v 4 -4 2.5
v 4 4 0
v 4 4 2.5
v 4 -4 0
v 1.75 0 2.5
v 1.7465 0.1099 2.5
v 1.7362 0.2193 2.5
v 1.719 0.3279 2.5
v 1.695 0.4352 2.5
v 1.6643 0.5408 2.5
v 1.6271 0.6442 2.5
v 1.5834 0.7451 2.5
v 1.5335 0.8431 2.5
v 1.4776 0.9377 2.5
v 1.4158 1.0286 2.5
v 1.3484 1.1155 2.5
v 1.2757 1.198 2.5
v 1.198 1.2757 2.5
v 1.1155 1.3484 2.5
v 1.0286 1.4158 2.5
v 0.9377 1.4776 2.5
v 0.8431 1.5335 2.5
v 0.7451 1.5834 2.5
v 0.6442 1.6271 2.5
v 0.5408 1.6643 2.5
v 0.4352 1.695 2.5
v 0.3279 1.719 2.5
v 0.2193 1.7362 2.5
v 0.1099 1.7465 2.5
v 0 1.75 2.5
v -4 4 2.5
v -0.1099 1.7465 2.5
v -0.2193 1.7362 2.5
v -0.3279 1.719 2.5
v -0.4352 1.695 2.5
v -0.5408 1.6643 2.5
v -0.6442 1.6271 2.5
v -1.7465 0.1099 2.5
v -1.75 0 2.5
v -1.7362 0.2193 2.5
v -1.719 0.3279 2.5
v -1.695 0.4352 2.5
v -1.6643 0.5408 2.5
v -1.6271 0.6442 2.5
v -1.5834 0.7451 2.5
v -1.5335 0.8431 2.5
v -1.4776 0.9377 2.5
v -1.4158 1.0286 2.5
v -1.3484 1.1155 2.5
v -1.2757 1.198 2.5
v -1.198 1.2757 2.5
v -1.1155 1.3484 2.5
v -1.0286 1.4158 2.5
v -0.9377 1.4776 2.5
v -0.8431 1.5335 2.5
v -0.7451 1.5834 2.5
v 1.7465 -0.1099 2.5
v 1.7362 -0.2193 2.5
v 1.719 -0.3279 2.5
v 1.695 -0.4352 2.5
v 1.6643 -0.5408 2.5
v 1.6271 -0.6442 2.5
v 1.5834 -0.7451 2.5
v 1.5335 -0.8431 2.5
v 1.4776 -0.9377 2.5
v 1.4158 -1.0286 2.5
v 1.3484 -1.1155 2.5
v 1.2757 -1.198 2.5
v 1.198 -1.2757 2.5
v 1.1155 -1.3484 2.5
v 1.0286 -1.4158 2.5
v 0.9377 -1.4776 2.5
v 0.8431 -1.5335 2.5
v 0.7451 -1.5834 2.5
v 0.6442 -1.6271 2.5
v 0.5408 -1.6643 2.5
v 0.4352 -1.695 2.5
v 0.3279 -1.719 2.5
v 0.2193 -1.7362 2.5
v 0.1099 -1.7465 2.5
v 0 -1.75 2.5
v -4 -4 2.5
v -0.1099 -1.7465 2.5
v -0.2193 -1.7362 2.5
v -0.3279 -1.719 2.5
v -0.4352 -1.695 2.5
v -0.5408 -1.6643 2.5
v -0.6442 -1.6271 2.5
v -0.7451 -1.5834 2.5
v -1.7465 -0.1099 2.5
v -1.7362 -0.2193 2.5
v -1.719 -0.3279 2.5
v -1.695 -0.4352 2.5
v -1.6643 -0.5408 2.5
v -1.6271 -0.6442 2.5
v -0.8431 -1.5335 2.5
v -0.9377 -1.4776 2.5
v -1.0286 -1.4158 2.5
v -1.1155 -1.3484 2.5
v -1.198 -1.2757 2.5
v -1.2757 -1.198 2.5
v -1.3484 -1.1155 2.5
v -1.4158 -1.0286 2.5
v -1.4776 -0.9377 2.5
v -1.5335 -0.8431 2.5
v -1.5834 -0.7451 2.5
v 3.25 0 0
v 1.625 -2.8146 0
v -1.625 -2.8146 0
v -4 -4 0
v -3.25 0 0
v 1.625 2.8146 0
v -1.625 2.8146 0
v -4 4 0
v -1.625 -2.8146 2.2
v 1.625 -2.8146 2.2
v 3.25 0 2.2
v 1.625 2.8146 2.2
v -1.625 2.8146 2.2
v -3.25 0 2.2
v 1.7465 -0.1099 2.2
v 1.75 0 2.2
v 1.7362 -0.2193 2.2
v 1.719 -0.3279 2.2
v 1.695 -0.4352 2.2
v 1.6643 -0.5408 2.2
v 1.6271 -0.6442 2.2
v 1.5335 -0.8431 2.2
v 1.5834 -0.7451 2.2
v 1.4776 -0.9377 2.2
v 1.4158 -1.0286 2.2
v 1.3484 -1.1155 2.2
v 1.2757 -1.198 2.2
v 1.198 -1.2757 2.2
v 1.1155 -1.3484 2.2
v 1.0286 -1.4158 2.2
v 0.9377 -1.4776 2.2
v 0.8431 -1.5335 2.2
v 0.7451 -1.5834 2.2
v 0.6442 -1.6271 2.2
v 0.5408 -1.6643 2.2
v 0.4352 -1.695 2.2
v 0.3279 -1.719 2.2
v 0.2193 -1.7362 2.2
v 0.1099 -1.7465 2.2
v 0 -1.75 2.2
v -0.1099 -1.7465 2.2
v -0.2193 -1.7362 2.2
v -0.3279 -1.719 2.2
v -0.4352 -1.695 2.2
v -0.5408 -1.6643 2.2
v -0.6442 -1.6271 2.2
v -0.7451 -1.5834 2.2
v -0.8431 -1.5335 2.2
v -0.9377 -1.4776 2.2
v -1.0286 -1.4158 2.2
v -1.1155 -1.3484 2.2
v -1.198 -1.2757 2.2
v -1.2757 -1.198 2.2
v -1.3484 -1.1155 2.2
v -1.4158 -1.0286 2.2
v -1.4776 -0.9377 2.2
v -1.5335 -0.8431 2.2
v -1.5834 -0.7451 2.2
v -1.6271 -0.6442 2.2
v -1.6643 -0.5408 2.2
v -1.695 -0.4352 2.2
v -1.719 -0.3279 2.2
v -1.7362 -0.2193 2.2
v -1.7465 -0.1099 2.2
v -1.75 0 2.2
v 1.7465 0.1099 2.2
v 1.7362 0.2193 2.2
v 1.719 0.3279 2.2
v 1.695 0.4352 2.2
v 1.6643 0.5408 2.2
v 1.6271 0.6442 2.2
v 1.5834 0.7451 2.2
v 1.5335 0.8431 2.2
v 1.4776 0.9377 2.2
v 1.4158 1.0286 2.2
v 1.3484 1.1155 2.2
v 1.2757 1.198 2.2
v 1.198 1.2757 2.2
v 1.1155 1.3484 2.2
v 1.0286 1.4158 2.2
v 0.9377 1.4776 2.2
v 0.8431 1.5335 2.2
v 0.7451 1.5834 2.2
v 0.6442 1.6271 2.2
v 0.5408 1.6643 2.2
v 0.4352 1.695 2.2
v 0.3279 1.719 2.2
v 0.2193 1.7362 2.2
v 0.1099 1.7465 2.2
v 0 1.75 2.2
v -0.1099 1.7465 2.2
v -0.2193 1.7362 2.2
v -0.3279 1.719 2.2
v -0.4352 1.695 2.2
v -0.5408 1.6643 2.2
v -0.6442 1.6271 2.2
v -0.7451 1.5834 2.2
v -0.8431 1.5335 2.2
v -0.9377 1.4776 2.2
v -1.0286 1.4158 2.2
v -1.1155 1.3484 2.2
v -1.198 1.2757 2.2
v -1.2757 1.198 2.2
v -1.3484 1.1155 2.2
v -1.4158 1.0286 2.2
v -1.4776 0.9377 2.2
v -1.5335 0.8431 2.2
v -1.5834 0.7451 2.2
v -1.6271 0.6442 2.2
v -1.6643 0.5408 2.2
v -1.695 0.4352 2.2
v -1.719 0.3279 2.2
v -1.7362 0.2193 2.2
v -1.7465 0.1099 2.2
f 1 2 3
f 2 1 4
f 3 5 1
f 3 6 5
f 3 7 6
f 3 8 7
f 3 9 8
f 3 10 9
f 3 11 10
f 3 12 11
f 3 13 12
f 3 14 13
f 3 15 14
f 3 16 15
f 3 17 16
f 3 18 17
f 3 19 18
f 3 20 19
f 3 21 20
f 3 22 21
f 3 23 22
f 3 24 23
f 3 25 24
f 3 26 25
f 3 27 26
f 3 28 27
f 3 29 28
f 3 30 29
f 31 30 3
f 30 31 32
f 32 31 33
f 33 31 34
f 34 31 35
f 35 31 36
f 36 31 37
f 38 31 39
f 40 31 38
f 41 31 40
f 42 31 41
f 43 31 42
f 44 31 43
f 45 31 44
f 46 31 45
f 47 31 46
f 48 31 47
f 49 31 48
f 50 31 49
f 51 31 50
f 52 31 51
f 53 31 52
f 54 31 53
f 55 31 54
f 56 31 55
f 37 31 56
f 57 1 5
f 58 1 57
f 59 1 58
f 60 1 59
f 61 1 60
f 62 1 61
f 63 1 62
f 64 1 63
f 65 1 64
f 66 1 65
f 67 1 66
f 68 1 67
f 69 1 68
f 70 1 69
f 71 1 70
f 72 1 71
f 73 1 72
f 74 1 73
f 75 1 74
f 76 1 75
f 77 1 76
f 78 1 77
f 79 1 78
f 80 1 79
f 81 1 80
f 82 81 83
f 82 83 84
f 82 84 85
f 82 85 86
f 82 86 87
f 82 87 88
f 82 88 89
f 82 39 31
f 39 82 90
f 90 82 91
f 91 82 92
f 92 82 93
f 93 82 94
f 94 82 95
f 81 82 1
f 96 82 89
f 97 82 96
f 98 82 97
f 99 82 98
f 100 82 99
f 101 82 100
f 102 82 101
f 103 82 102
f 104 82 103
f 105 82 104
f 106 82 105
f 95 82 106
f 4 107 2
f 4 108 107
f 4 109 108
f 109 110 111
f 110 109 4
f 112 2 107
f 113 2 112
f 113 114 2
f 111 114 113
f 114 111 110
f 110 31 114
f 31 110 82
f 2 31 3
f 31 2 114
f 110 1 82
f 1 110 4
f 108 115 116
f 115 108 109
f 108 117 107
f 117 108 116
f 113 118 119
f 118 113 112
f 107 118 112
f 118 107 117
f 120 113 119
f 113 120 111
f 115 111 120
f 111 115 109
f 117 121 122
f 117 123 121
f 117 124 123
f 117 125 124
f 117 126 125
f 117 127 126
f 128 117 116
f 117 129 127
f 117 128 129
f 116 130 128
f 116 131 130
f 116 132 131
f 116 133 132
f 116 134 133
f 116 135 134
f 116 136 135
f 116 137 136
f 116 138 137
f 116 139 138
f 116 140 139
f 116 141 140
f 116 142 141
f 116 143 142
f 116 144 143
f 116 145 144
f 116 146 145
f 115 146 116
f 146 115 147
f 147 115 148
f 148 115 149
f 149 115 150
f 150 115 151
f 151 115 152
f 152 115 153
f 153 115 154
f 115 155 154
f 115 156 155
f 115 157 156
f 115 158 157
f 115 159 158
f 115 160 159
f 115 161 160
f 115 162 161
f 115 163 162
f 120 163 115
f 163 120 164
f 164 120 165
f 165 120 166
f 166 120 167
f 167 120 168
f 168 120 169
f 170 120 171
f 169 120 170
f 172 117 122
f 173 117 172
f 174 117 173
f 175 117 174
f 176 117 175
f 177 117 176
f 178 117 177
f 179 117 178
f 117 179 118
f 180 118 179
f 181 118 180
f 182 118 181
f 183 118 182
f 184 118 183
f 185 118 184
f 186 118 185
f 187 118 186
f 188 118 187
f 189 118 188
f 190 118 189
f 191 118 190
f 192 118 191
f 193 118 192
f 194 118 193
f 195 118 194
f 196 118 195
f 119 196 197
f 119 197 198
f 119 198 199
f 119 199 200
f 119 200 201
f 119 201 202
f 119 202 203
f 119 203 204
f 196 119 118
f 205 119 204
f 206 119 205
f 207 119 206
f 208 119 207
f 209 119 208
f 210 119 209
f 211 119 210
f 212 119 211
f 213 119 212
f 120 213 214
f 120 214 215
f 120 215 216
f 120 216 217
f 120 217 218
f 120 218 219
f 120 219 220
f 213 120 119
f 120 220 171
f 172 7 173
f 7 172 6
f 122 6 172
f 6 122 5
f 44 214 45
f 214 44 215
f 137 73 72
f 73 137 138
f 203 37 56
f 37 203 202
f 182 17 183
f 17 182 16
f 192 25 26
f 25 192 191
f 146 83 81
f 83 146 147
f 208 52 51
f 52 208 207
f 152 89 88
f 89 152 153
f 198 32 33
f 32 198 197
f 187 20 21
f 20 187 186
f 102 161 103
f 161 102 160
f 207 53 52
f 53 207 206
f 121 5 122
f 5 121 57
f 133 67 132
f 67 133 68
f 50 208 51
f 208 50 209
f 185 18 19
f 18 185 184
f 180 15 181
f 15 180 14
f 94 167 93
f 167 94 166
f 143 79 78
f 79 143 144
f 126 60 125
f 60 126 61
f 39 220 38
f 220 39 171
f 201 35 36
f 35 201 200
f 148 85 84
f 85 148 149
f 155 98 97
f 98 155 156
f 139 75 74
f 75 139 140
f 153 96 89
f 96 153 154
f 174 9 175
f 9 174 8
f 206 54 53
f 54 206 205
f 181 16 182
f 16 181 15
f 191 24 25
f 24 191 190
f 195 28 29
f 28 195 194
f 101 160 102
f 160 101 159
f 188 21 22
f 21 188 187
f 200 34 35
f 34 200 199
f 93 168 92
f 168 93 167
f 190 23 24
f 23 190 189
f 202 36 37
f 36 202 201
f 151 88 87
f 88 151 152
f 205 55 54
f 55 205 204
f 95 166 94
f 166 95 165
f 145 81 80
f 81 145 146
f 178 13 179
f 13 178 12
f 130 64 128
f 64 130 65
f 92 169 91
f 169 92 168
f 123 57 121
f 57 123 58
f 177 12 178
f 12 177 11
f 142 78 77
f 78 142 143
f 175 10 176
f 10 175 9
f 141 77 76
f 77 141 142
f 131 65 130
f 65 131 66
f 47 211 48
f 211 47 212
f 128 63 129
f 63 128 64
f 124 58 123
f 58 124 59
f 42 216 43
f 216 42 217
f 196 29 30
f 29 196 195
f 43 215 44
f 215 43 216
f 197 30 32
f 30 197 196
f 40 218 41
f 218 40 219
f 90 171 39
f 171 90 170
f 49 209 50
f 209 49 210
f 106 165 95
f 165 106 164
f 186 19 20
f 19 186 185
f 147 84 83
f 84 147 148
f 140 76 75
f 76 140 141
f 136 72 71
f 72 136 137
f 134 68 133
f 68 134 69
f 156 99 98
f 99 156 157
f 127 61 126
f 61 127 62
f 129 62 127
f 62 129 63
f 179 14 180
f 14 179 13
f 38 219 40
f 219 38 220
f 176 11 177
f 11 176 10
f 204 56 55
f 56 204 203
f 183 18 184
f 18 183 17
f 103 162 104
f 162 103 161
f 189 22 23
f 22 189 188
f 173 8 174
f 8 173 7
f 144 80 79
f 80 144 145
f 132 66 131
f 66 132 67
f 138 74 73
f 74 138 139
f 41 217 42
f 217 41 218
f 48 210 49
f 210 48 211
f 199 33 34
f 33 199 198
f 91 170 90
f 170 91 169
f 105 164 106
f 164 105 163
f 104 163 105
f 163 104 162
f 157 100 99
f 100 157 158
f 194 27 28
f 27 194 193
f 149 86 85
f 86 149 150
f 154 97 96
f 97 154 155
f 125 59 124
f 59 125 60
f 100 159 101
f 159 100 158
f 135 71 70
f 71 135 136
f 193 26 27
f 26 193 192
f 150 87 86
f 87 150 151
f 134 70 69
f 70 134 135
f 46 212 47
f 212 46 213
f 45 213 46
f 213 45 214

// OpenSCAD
difference() {
  translate([-4, -4, 0]) cube([8, 8, 2.5]);
  cylinder(h = 2.2, r = 3.25, $fn = 6);
  cylinder(h = 2.5, d = 3.5, $fn = 100);
}
